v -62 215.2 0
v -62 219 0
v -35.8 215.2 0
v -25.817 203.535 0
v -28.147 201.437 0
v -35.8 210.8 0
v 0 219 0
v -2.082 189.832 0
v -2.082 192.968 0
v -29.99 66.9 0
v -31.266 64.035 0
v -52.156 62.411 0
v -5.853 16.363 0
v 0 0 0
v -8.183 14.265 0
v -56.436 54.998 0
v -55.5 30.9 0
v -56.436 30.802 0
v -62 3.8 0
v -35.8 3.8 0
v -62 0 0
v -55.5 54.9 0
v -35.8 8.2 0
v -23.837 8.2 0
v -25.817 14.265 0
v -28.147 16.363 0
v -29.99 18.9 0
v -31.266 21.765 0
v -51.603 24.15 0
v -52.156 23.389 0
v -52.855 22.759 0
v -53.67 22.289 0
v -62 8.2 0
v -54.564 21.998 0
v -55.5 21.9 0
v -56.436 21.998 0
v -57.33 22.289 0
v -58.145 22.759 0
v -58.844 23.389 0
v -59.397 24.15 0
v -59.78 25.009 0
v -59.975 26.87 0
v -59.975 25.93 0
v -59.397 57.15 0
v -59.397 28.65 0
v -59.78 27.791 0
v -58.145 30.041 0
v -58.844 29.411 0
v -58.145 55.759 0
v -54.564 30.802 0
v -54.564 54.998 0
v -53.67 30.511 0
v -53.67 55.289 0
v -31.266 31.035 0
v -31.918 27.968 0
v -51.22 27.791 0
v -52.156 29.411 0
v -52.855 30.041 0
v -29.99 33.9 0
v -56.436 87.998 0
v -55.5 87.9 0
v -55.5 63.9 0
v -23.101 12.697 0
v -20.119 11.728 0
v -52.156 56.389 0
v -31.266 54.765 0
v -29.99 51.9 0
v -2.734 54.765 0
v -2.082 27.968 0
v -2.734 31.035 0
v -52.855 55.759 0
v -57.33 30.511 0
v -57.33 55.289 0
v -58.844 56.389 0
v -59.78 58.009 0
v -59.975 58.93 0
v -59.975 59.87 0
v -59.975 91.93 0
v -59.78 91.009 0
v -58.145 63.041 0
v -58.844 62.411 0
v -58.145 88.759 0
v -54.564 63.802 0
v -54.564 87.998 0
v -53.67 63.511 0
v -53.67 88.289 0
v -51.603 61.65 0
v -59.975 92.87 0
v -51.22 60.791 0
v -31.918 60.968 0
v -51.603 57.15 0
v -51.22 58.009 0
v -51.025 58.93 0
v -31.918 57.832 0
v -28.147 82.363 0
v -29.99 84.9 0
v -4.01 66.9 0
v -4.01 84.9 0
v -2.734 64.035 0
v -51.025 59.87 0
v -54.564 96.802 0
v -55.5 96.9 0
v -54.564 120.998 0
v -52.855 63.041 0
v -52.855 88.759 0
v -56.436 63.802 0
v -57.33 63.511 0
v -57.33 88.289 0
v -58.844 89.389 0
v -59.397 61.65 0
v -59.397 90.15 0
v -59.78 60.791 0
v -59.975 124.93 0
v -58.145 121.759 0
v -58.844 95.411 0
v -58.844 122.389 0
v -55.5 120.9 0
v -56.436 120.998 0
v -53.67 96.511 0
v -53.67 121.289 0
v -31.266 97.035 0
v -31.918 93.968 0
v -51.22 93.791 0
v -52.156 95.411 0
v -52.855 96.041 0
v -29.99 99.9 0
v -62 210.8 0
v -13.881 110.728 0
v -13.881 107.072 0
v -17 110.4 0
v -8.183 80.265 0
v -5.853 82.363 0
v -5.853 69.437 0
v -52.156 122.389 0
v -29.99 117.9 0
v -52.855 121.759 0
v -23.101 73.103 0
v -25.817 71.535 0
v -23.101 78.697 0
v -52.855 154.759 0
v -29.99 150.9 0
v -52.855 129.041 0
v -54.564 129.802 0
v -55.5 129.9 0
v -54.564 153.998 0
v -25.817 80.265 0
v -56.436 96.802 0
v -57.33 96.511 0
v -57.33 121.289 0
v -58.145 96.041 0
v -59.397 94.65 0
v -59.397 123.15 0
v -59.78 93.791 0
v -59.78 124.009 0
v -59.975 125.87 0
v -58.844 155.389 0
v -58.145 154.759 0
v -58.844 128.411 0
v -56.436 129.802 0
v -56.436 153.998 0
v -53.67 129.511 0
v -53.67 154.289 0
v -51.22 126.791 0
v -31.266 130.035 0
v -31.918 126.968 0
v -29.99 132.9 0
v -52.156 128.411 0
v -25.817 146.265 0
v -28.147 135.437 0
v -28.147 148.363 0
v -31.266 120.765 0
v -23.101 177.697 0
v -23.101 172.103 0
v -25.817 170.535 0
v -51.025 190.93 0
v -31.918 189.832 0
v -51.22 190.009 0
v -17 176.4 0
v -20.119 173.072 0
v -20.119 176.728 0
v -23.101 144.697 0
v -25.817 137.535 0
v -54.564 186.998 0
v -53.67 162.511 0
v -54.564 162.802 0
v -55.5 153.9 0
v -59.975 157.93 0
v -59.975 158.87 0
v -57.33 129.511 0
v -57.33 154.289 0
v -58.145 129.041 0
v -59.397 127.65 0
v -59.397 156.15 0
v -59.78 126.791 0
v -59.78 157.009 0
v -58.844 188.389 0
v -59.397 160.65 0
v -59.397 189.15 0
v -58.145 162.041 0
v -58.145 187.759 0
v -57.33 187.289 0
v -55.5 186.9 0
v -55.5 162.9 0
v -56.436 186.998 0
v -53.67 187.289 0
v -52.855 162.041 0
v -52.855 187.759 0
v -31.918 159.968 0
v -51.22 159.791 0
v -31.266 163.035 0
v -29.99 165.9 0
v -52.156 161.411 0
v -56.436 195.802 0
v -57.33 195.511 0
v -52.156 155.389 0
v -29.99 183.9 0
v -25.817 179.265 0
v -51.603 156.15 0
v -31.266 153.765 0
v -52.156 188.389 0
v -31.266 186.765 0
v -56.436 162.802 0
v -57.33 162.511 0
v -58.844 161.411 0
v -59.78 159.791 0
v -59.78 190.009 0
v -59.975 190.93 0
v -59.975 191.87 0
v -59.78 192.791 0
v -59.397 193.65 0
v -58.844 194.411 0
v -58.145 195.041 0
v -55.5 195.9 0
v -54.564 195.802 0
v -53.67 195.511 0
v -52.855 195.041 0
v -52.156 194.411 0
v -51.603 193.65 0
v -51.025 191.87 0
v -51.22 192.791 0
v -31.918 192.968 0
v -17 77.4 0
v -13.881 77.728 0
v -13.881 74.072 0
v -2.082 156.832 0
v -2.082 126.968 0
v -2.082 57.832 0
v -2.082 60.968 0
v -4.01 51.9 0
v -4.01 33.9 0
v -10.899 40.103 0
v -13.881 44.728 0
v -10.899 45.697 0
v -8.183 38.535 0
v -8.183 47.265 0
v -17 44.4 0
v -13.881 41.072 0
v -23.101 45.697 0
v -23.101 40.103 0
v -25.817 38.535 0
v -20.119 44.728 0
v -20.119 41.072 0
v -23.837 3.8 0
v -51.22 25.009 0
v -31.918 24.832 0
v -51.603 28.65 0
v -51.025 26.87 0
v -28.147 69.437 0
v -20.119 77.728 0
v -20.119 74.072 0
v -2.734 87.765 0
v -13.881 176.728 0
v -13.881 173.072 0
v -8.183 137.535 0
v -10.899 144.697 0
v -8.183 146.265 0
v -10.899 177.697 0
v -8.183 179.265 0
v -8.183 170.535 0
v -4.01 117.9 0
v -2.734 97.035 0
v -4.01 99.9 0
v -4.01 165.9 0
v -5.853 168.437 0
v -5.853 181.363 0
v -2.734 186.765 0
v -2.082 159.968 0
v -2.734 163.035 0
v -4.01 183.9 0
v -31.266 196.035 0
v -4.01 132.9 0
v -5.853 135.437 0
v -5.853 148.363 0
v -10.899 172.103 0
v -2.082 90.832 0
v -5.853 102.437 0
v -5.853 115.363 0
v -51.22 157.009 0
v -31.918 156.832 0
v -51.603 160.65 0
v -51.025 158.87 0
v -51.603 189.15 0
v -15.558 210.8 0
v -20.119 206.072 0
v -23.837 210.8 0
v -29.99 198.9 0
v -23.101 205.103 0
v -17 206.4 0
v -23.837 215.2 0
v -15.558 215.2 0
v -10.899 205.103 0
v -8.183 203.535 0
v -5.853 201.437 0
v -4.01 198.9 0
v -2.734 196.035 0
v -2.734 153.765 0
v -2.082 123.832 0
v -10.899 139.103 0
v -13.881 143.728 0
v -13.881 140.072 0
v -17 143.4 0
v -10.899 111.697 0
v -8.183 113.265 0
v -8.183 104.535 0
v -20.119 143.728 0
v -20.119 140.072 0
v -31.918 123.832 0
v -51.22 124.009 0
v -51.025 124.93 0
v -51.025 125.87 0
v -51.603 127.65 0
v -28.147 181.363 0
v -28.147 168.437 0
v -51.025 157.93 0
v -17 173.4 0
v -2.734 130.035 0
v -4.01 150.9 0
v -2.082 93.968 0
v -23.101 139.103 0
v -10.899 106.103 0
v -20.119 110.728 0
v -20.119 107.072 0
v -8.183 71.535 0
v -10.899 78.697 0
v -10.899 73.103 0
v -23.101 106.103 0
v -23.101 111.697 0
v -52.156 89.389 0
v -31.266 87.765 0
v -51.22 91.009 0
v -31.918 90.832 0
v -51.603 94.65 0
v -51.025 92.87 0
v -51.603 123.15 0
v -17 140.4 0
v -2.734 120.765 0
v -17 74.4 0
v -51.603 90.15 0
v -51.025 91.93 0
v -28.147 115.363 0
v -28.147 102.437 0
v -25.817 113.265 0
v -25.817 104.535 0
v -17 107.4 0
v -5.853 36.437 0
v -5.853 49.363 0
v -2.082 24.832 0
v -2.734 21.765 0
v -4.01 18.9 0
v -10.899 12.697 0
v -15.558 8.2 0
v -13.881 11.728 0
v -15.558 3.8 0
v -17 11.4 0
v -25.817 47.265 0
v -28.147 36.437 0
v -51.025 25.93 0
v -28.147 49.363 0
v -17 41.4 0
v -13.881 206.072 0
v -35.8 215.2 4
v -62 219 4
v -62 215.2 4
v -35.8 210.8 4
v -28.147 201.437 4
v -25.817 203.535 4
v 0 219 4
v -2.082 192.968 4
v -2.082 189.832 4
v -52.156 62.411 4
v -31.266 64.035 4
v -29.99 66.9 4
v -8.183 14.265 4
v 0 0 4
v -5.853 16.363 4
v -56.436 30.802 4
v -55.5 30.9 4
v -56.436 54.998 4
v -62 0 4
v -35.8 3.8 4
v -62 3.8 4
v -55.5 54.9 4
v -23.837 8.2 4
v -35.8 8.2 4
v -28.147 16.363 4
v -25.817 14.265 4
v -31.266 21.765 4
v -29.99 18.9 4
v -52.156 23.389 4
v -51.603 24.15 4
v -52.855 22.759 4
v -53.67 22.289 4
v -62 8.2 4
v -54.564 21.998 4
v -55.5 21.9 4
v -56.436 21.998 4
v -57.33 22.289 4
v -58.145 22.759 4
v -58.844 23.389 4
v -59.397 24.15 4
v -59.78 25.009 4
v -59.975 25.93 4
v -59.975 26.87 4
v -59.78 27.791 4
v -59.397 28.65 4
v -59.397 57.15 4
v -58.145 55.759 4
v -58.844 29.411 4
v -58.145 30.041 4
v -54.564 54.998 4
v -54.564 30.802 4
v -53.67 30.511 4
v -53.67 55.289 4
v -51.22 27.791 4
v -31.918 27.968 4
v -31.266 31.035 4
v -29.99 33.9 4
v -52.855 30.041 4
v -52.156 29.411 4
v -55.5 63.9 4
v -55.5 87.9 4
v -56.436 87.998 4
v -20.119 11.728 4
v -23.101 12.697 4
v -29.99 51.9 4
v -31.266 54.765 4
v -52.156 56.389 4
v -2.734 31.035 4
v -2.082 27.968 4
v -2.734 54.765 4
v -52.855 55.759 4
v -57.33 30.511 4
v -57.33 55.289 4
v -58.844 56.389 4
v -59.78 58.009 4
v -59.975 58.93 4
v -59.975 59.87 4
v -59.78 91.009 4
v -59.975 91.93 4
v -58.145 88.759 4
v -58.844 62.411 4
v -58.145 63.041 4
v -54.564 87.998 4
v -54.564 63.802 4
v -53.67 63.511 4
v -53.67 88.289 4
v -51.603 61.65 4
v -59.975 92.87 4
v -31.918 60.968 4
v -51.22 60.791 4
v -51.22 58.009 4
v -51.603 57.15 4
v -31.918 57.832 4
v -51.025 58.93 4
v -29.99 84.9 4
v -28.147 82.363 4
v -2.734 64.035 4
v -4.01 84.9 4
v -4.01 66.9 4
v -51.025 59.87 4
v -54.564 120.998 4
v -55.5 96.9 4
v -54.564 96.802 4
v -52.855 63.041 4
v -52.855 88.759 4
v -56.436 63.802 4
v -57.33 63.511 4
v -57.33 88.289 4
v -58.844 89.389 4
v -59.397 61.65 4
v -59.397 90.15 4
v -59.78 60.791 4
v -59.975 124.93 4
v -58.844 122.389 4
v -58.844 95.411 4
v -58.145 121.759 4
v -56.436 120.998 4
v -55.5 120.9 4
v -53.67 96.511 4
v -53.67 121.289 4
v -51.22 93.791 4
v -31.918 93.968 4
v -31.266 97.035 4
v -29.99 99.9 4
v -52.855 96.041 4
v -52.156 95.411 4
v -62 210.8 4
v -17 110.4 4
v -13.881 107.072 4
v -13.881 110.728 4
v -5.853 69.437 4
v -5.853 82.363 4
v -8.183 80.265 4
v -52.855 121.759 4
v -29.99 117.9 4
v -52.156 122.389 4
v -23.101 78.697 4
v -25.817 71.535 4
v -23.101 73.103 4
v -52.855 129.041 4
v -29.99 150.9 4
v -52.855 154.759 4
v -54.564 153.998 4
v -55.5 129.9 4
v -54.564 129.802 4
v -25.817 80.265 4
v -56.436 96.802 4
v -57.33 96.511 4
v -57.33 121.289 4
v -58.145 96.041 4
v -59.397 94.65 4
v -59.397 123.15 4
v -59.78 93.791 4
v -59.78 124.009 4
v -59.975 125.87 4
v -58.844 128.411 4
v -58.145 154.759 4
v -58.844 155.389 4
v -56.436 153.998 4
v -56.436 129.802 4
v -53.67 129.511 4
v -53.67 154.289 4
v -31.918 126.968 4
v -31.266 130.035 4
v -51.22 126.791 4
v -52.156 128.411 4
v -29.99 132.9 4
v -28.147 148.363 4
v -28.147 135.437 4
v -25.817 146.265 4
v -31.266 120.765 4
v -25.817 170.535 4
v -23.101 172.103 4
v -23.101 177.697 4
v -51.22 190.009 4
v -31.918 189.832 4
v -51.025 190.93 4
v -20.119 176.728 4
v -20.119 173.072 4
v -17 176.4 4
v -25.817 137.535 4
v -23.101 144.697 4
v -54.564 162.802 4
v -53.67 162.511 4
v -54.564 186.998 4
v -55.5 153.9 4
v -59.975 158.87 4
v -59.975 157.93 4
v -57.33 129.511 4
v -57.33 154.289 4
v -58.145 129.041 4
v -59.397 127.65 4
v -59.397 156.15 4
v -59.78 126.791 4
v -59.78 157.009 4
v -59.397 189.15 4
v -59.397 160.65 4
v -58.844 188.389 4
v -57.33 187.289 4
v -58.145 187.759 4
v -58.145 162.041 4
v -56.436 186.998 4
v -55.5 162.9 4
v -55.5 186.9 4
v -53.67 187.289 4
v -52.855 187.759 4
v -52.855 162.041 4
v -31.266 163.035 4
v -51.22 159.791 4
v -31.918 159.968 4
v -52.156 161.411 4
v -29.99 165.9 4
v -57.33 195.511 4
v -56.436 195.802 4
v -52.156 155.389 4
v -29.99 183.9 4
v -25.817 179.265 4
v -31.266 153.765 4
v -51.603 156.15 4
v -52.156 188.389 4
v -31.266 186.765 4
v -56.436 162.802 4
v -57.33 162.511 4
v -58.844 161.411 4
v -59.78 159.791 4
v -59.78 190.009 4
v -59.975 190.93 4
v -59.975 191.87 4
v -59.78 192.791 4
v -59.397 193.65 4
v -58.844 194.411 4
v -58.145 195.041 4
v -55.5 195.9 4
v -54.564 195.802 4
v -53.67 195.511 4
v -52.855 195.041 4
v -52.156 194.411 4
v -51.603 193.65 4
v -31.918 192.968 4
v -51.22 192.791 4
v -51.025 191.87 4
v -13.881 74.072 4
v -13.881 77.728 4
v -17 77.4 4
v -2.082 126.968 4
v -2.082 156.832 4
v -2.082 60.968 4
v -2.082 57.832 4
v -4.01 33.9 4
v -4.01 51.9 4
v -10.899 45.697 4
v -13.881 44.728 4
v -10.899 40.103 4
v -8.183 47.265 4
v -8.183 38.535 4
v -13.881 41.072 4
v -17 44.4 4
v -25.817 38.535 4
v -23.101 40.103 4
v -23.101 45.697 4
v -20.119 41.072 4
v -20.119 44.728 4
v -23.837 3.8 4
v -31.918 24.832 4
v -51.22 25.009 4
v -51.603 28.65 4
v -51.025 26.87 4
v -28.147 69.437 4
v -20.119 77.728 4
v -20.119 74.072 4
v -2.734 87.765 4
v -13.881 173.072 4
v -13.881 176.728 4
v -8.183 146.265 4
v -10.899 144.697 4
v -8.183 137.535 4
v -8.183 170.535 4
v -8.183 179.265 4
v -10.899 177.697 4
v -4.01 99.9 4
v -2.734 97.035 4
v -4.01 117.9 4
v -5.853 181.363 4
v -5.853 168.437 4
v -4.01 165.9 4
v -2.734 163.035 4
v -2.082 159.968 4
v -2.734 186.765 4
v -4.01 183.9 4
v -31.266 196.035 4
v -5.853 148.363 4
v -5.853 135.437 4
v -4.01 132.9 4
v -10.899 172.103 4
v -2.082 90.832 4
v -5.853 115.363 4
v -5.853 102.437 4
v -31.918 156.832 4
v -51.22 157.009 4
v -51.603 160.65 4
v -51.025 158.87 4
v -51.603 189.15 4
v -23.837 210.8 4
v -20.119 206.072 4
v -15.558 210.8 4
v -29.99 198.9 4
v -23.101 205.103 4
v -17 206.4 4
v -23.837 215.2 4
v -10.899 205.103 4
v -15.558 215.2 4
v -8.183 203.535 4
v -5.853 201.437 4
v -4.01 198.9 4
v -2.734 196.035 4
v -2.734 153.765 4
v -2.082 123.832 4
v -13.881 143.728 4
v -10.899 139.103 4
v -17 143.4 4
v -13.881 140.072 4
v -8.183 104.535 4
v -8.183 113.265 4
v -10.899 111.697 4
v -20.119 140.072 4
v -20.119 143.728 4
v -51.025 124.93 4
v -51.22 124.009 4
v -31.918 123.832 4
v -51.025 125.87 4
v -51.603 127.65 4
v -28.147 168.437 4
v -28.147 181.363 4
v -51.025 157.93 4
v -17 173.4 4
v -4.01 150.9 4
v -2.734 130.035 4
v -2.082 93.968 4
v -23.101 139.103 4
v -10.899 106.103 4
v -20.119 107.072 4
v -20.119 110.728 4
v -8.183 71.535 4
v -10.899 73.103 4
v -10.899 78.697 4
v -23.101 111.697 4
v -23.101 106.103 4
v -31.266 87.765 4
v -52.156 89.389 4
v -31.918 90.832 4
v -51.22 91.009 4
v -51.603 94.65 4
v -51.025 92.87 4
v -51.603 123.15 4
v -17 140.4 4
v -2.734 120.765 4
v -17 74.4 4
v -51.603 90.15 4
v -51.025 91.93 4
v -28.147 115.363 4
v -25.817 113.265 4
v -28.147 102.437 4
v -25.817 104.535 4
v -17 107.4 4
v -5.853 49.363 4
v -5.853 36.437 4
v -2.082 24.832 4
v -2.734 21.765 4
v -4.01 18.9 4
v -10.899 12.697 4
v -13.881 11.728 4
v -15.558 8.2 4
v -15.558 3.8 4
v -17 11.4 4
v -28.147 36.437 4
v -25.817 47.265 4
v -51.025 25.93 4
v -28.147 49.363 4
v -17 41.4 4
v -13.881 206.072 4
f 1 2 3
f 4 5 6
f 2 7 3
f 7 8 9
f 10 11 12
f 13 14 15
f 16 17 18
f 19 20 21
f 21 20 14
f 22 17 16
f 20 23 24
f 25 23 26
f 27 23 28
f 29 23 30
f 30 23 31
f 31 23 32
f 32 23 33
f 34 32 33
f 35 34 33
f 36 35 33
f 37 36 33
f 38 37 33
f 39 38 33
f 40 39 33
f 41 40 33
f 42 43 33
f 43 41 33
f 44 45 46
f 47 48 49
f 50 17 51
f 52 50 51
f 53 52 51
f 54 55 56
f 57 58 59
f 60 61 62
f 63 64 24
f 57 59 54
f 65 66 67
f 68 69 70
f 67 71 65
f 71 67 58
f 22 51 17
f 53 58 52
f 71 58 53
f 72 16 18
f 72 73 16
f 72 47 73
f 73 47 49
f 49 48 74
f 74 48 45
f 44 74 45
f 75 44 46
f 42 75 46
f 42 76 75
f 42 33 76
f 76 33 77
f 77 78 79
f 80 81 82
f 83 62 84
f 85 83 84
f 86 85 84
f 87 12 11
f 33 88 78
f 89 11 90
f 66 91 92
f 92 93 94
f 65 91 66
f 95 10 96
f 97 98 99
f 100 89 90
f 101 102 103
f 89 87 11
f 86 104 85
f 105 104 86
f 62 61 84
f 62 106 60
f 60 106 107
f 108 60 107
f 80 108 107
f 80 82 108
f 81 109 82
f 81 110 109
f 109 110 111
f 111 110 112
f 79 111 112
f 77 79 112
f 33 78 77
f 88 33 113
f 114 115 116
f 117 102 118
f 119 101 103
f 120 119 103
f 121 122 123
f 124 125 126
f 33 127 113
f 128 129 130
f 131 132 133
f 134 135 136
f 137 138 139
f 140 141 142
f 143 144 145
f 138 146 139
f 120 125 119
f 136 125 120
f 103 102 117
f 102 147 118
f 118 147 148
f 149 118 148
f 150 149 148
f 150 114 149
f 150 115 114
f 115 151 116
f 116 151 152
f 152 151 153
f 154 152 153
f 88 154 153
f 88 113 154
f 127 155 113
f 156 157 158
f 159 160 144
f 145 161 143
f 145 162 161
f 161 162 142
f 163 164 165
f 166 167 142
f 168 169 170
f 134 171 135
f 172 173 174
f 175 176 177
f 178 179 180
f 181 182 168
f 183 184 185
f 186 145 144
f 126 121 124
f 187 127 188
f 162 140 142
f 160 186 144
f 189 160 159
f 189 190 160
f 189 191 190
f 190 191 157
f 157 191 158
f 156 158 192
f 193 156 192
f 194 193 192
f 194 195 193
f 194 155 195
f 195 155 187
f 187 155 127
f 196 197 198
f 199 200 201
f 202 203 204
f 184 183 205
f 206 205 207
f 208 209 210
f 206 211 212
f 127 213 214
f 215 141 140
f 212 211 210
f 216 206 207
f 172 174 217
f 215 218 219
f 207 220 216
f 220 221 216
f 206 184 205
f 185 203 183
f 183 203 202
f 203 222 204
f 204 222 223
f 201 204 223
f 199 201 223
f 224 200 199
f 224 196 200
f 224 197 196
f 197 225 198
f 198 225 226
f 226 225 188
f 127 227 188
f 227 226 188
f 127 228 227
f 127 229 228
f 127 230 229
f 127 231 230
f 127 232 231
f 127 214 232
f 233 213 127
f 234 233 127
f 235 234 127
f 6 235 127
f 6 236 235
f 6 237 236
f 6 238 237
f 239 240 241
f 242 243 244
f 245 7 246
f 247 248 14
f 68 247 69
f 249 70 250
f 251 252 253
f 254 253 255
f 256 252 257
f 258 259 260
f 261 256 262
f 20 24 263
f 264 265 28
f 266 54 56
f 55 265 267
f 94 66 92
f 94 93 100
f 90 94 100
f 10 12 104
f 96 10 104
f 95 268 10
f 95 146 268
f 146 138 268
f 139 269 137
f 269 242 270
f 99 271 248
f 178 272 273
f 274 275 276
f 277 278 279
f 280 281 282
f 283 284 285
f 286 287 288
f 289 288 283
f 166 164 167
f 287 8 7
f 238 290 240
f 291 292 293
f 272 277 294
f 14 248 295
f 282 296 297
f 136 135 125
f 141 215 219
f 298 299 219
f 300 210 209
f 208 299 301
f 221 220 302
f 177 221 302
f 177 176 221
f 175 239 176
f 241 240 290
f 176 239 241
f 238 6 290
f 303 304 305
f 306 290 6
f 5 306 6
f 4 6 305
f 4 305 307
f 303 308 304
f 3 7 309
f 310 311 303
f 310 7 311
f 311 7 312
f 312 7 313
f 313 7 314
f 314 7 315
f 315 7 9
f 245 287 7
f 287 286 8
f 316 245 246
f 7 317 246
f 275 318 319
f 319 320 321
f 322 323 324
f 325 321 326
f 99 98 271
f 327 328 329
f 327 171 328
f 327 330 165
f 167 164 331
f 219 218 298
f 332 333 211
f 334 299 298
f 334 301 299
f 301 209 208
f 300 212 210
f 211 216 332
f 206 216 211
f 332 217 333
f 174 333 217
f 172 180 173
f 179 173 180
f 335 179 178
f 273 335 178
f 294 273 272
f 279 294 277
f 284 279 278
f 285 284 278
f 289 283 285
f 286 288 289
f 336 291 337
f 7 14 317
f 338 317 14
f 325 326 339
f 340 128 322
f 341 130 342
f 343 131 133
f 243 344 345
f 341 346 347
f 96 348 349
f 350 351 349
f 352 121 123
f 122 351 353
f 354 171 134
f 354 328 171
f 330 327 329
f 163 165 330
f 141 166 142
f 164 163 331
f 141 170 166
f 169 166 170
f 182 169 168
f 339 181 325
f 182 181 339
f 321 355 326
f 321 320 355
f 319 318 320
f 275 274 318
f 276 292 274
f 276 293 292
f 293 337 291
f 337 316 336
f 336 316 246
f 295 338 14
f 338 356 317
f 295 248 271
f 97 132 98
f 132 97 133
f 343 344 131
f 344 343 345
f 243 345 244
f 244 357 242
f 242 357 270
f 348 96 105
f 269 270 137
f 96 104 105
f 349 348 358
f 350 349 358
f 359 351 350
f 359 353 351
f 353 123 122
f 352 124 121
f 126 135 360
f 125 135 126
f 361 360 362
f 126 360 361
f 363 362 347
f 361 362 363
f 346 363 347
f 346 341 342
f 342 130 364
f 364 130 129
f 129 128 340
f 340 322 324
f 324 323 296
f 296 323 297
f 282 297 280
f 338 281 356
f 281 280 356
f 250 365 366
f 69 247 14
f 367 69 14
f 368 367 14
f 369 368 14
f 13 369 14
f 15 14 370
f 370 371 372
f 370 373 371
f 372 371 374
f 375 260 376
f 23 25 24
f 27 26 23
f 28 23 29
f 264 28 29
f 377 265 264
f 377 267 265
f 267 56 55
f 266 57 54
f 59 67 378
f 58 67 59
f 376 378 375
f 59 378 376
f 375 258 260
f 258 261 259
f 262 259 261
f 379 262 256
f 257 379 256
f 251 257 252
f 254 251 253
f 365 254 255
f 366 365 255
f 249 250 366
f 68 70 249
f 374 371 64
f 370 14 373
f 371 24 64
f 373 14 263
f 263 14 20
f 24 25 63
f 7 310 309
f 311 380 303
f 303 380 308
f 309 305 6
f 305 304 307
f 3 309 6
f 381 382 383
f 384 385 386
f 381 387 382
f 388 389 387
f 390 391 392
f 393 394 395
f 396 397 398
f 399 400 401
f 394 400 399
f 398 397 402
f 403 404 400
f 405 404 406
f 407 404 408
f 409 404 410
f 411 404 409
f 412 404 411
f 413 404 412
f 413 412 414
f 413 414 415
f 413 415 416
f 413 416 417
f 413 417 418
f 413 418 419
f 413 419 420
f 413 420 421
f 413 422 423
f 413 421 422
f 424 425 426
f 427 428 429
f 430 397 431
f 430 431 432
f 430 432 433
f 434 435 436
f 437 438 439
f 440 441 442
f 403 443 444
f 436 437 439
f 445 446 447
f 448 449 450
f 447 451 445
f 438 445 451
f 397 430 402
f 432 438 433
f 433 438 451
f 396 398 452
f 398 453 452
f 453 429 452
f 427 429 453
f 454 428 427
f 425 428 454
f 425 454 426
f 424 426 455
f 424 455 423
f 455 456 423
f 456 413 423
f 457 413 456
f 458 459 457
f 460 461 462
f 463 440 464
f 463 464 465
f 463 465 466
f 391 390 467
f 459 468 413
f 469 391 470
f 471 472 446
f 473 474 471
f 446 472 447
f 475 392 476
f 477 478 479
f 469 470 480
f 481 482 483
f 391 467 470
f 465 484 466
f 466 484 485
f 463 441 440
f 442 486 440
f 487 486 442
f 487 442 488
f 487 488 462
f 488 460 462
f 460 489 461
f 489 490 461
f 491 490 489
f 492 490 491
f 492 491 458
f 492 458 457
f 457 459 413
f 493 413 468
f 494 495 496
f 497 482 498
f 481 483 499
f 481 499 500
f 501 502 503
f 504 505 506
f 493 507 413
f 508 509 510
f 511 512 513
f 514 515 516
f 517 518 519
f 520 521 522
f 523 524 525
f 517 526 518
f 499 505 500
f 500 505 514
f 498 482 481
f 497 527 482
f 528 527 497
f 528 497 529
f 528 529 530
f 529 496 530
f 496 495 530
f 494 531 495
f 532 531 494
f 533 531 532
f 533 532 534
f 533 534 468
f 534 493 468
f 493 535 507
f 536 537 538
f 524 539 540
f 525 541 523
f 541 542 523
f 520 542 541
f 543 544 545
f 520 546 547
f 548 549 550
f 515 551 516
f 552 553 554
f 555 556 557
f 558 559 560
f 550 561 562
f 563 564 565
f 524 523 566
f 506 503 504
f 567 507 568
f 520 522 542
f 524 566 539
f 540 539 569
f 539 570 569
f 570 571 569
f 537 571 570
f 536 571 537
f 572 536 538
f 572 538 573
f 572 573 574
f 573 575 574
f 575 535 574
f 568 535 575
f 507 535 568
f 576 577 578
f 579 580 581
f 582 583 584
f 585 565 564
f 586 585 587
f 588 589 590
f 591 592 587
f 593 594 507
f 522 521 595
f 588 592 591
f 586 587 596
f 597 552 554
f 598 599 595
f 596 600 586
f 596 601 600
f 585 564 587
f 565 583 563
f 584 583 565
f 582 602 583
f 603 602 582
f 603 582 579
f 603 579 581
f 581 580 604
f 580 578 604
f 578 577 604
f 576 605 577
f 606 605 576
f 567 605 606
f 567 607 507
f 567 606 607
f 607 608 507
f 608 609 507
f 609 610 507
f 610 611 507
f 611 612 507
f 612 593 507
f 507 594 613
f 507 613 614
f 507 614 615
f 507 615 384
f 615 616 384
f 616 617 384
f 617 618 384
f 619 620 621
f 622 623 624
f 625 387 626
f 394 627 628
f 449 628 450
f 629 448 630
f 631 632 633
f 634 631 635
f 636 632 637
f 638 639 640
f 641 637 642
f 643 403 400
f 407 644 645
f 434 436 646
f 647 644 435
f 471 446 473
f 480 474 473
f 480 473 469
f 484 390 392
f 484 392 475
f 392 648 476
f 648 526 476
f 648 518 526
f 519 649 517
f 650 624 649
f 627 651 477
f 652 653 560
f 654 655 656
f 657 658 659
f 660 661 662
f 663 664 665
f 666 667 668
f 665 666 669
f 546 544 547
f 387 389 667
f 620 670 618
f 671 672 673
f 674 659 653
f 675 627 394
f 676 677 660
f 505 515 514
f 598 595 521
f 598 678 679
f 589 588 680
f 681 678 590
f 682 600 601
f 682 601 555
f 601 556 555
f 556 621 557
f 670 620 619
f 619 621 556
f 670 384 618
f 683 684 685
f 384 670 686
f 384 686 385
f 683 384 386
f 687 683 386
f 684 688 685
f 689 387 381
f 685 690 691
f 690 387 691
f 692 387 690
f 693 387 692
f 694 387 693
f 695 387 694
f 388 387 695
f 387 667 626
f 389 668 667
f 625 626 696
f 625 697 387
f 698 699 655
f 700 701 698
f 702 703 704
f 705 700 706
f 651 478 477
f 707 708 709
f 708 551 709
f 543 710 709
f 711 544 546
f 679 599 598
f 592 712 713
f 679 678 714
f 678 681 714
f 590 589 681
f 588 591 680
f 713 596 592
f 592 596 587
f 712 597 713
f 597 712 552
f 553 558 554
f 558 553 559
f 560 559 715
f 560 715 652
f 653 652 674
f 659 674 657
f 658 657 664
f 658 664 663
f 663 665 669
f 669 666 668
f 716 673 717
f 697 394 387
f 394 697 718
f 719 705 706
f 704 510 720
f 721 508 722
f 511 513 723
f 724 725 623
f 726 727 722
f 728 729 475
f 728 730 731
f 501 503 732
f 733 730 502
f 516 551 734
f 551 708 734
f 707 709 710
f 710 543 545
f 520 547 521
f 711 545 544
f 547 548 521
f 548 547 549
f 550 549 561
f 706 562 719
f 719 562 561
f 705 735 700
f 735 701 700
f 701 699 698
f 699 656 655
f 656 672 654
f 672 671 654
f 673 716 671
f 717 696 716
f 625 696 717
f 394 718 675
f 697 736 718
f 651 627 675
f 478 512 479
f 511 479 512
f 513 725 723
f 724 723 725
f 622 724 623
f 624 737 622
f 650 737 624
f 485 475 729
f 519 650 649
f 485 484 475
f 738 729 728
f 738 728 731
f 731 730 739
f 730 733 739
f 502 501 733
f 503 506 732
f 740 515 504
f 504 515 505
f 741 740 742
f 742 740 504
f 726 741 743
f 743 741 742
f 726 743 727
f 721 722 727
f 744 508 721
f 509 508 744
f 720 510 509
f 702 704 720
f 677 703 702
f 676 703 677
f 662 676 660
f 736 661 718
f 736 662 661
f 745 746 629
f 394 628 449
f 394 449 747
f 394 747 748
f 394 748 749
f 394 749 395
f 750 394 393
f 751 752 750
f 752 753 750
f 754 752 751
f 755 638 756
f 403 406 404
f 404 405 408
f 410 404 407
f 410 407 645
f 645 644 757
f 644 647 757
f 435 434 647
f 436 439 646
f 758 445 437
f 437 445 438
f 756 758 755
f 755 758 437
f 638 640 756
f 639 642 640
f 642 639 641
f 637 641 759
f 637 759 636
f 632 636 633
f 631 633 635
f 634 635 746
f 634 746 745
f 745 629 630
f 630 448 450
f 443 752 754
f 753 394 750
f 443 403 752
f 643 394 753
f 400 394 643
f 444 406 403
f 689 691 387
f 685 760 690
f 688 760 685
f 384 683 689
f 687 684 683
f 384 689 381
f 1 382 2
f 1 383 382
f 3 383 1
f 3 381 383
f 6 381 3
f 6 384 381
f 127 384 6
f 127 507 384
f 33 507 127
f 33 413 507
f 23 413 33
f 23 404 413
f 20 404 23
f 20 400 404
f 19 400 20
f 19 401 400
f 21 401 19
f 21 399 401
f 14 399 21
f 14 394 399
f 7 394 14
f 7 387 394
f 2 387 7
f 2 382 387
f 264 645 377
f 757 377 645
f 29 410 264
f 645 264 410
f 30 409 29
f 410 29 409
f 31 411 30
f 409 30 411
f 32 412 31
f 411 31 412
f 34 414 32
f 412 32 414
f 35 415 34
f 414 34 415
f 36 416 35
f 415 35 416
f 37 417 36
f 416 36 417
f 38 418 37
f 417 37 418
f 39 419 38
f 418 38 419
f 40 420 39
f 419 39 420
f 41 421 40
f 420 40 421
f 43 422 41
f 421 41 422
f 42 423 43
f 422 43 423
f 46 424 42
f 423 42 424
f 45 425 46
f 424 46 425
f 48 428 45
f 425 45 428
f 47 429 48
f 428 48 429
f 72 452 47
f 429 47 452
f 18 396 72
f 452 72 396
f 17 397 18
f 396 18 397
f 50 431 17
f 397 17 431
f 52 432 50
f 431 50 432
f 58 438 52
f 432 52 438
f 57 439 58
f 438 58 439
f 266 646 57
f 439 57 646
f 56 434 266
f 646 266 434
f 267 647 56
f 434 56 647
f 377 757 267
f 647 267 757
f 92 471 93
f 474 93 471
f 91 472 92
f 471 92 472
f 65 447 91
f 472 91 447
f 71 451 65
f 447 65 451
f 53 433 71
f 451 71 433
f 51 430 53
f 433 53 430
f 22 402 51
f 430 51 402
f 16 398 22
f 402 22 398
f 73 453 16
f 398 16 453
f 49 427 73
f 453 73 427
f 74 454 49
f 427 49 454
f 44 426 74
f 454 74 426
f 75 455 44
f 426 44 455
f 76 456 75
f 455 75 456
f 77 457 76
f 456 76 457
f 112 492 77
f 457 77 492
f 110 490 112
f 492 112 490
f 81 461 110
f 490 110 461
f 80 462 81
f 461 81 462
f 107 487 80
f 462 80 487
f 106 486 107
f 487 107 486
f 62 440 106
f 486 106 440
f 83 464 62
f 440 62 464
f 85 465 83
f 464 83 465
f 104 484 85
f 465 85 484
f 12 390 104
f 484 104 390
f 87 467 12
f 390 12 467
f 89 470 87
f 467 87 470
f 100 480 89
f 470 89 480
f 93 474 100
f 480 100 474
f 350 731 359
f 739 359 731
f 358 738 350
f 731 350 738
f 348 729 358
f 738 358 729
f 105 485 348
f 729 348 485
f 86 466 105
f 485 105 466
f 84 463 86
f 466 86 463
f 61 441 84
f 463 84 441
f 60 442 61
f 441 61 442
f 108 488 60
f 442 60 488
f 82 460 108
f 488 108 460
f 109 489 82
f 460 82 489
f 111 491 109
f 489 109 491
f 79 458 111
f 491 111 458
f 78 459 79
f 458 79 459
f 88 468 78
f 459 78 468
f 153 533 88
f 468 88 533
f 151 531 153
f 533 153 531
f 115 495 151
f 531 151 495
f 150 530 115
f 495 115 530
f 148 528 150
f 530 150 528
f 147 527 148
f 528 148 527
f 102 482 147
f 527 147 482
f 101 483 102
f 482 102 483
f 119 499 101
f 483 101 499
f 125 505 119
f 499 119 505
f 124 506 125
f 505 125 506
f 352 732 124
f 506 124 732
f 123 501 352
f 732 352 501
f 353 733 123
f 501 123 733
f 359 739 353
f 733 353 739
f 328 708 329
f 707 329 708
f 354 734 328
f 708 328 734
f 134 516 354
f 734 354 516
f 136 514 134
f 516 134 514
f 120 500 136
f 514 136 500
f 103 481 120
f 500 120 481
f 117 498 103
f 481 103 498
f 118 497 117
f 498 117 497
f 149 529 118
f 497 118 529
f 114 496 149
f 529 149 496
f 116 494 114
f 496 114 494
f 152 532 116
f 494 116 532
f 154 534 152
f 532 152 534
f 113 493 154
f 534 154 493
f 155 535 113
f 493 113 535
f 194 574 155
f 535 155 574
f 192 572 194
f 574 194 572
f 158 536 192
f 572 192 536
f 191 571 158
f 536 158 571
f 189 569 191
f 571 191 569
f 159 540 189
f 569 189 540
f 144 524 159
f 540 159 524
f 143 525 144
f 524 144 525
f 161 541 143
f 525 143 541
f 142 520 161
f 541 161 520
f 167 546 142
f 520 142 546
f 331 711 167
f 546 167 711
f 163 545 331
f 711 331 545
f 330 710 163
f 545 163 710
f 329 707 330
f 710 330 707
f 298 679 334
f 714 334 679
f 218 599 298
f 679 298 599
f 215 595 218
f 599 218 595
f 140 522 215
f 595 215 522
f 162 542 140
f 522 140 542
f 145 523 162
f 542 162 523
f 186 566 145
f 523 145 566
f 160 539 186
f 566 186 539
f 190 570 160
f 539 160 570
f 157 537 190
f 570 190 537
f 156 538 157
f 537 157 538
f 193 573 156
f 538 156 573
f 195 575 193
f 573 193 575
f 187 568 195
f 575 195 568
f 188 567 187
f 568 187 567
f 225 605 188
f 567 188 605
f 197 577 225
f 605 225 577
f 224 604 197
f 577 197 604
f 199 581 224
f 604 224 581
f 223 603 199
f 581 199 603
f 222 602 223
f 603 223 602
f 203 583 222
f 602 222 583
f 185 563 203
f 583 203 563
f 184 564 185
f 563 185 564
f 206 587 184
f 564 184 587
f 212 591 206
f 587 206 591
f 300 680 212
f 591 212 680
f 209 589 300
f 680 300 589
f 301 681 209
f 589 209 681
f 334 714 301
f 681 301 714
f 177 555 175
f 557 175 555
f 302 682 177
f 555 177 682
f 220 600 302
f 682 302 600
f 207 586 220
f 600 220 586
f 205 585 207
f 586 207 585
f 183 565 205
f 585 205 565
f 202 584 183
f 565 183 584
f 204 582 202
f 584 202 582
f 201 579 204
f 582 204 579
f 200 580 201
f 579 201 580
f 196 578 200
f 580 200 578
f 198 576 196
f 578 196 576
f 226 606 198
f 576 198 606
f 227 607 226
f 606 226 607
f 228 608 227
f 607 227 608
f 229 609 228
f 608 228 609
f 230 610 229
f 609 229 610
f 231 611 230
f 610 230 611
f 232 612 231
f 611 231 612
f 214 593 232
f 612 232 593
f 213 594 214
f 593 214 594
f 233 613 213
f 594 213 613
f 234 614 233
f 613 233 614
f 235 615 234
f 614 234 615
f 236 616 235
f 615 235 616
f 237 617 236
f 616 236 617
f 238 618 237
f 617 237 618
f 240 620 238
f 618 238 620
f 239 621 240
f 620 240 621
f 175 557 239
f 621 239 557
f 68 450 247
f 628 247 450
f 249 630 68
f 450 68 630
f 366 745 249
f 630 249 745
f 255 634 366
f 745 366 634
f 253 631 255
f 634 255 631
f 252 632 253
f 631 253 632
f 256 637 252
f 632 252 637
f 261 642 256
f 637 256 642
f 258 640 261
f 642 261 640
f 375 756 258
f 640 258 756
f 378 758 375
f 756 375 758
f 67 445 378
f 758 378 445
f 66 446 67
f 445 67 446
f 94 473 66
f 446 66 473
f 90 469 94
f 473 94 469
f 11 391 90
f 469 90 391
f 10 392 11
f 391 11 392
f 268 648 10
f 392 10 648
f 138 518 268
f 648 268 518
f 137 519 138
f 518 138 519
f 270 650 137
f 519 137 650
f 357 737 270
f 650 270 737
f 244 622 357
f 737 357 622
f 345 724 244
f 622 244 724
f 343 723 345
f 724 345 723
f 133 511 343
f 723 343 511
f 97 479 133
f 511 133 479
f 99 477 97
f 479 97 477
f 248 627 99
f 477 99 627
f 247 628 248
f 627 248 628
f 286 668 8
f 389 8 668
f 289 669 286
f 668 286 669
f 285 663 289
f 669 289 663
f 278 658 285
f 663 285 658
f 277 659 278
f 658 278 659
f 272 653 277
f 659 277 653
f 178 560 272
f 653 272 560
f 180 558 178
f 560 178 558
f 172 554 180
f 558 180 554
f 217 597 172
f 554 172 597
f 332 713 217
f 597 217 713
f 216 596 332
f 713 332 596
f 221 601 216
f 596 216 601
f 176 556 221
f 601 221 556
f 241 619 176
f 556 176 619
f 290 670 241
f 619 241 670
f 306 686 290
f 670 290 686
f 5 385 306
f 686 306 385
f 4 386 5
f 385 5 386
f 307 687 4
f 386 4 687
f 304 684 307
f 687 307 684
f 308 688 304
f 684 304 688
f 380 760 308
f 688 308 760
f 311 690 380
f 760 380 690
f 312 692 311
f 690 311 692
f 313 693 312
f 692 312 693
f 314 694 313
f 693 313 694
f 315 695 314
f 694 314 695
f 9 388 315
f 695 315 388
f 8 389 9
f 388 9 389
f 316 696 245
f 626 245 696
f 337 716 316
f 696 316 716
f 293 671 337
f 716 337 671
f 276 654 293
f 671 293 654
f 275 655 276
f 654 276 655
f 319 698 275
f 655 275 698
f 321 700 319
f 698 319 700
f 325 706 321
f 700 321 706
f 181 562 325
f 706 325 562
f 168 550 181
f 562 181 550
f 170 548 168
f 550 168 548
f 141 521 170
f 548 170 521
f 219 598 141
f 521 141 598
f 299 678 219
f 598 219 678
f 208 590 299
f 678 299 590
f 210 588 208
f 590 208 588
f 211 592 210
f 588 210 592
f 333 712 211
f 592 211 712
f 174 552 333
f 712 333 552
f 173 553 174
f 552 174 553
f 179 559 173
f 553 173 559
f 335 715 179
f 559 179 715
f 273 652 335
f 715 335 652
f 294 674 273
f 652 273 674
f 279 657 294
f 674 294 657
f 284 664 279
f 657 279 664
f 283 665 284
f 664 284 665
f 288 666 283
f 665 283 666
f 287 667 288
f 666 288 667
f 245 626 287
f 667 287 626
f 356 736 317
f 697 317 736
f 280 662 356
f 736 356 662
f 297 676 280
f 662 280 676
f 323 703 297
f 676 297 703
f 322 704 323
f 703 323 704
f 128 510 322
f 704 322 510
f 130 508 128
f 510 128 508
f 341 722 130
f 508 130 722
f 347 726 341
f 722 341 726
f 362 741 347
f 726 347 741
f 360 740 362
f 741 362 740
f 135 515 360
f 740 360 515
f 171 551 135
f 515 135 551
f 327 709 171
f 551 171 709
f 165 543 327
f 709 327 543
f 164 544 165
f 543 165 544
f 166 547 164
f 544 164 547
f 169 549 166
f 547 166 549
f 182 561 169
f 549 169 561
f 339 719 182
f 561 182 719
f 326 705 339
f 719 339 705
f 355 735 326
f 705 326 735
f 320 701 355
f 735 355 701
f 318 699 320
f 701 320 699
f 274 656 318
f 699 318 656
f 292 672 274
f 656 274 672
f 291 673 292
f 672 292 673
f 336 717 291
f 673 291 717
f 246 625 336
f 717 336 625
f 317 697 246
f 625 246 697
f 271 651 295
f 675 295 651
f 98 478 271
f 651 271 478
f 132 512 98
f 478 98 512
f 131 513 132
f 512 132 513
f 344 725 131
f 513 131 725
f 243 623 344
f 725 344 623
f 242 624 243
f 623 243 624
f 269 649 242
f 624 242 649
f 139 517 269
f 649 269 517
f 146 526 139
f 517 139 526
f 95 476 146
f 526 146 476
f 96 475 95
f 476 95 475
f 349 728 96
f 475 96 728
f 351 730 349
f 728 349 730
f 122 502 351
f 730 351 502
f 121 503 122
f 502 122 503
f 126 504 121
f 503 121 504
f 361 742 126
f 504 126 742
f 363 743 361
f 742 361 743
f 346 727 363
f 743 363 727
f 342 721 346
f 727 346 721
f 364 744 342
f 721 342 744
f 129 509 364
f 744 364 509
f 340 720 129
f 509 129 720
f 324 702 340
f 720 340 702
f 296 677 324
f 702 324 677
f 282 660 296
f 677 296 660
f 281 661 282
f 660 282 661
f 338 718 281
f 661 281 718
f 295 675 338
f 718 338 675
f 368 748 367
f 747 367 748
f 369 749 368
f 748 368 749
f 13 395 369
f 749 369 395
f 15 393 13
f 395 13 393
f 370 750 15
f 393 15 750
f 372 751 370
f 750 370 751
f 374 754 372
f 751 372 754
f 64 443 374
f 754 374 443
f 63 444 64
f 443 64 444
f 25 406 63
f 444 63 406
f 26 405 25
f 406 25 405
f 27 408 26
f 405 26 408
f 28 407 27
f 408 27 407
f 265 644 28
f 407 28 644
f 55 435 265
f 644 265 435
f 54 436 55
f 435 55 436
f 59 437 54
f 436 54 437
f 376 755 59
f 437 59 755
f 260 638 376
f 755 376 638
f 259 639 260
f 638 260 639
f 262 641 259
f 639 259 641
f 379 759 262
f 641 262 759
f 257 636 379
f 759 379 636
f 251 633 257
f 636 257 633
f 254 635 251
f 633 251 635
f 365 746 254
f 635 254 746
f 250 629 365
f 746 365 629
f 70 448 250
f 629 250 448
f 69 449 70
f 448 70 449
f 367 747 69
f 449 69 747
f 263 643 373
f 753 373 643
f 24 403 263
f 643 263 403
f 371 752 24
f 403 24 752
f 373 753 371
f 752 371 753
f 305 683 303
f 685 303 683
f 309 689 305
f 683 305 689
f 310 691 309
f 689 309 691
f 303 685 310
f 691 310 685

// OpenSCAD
/*
 * Miniature Paint Shelves
 * By Craig Wood
 *
 * Copyright 2019 Craig Wood - http://github.com/w3ace
 * This program is free software: you can redistribute it and/or modify
 * it under the terms of the GNU General Public License as published by
 * the Free Software Foundation, either version 3 of the License, or
 * (at your option) any later version.
 *
 * This program is distributed in thehope that it will be useful,
 * but WITHOUT ANY WARRANTY; without even the implied warranty of
 * MERCHANTABILITY or FITNESS FOR A PARTICULAR PURPOSE.  See the
 * GNU General Public License for more details.
 *
 * See <http://www.gnu.org/licenses/>.

 */



$fn=30;

num_shelves = 4;


// SHELF WIDTH, HEIGHT, AND THICKNESS should be based on known paint brands
// VALLEJO : 
// shelf_size = 62;
// shelf_width = 44;
// shelf_depth = 28;
// large_holes = 30;
// small_holes = 9;



shelf_size = 62;
large_holes = 30;
small_holes = 9;
num_holes = 6;

shelf_width=36;
shelf_depth=16;

shelf_thickness = 4;
slop = .2;


/*
shelf_angle = 35;
shelf_size = 29;
large_holes = 15;
small_holes = 4.5;
num_holes = 6;

shelf_width=22;
shelf_depth=14;

shelf_thickness = 2;
slop = .2;
*/

	hyp=hypotenuse(shelf_width,shelf_depth);
	shelf_length=num_holes*large_holes*1.1+large_holes*.7;

	echo (shelf_length);


		rotate([0,0,90])
				make_shelf(num_holes,large_holes,small_holes,shelf_thickness,
					shelf_size,shelf_width,slop,hyp,type="middle");
//
//first_plate();

//// second_plate();
	// MIDDLE SHELF
module first_plate ()
{
	hyp=hypotenuse(shelf_width,shelf_depth);

	// MIDDLE SHELF
	translate([sin(atan(1.8/2.6))*(hyp*(num_shelves+1.3))+shelf_size+1,0,0])

		rotate([0,0,90])
				make_shelf(num_holes,large_holes,small_holes,shelf_thickness,
					shelf_size,shelf_width,slop,hyp,type="middle");

	// UPRIGHT
	translate([0,1,0])
	rotate([0,0,90-atan(1.8/2.6)])
		make_shelf_upright (num_shelves,shelf_width,shelf_depth,shelf_thickness);

  // UPRIGHT
	translate([0,0,shelf_thickness])
	rotate([180,0,90-atan(1.8/2.6)])
		make_shelf_upright (num_shelves,shelf_width,shelf_depth,shelf_thickness);
}

module second_plate ()
{

	hyp=hypotenuse(shelf_width,shelf_depth);

	for(i=[1:3])
		translate([(shelf_size+1)*i,0,0])
			rotate([0,0,90])
				linear_extrude(height=shelf_thickness)
					make_shelf(num_holes,large_holes,small_holes,shelf_thickness,
						shelf_size,shelf_width,slop,hyp);

}

function hypotenuse (l1,l2) = sqrt(l1*l1+l2*l2);

module make_shelf (num_holes,large_holes,small_holes,shelf_thickness,shelf_size,shelf_width,slop,hyp,type="middle")
{

	shelf_length=num_holes*large_holes*1.1+large_holes*.7;


	union() 
	{
		if(type=="top")
	  	translate([0,shelf_width,0])
				rotate([90,0,0])
					difference () {
						union () {
							linear_extrude(height=shelf_thickness)
								square([shelf_length,shelf_width]);
							translate([0,shelf_width,shelf_thickness])	
								rotate([0,90,0])
									cylinder(shelf_length,r=shelf_thickness);
						}
						translate([shelf_width-shelf_thickness,-shelf_depth*.8,0])
							square(size=[shelf_thickness,shelf_depth*.4]);
					}

		linear_extrude(height=shelf_thickness)
			difference()
			{
				if(type=="bottom")
				{
					square([shelf_length,shelf_size-small_holes-2]);
				} else {
					square([shelf_length,shelf_size]);
				}
				for(i=[1:num_holes])
				{
					if(type != "top")
						translate ([(i-.2)*large_holes*1.1,2+(large_holes/2),0])
							circle (d=large_holes);
					if(type != "bottom")
						translate ([(i-.2)*large_holes*1.1,(shelf_width-large_holes)+(large_holes*1.5)+(small_holes/2),0])
							circle (d=small_holes);
				}
			
				// SLOTS FOR UPRIGHTS
				translate([shelf_thickness-slop,shelf_width-slop,0])
					square([shelf_thickness+slop*2,shelf_size-shelf_width+slop*2]);
				translate([shelf_length-shelf_thickness*2-slop,shelf_width-slop,0])
					square([shelf_thickness+slop*2,shelf_size-shelf_width+slop*2]);

				// SLOTS FOR NOTCHES
				translate([shelf_thickness-slop,hyp*.4-slop])
					square(size=[shelf_thickness+slop*2,hyp*.2+slop*2]);
				translate([shelf_length-shelf_thickness*2-slop,hyp*.4-slop])
					square(size=[shelf_thickness+slop*2,hyp*.2+slop*2]);
			}
	}
}

module make_shelf_upright (num_shelves,shelf_width,shelf_depth,shelf_thickness)
{

	hyp = hypotenuse(shelf_width,shelf_depth);

	linear_extrude(height=shelf_thickness)
		difference()
		{

			// MAIN TRIANGLE
			polygon(points=[[0,0],[hyp*(num_shelves+1.3),0],[hyp*2.6,hyp*1.8]]);

			// SHELF CUTOUTS 
			translate([-hyp*.8,0,0])	
			for(i=[1:num_shelves])
			{
				color("Red")
				translate([hypotenuse(shelf_width,shelf_depth)*i,0,0])
					rotate([0,0,90-atan(shelf_width/shelf_depth	)])
						difference ()
						{					
						translate([0,-shelf_depth,0])
							square(size=[shelf_width,shelf_depth]);

						// Notches to attach shelves
						translate([hyp*.4,-shelf_thickness,0])	
							square(size=[hyp*.2,shelf_thickness]);
						
						// Extra Notch for top shelf
						if (i==1){
							translate([shelf_width-shelf_thickness,-shelf_depth*.8,0])
								square(size=[shelf_thickness,shelf_depth*.4]);
						}
					}
			}

			// ROWS OF CIRCLE CUTOUTS
			// 
			//
		for(j=[1:num_shelves-1])
				for(i=[1:num_shelves-j])
					translate([hyp*i+hyp*((j-.3)*.5),hyp*(.55+(j-1)*.3),0])
						if(i==num_shelves-j)
						{
							translate([3,3])
							rotate([0,0,124.7])
								scale([1,2])
									circle(d=hyp*.4);
						} else {
								circle(d=hyp*.4);
						}




/*
				for(i=[1:num_shelves-2])
					translate([hyp*i+hyp,hyp*.85,0])
						circle(d=hyp*.4);
				
				for(i=[1:num_shelves-3])
					translate([hyp*i+hyp*1.5,hyp*1.1,0])
						circle(d=hyp*.4);
*/
			//CUT OFF THE BOTTOM POINT
			polygon(points=[[hyp*(num_shelves+.5),0],[hyp*(num_shelves+2),0],[(hyp*(num_shelves+.5)),hyp]]);		
		}
}
/*
union()
{
	for(i = [1:num_shelves])
	{	
		translate([(num_shelves-i)*shelf_width,(i-1)*shelf_depth])	
			scale([i-(i*.25),i])
				polygon(points=[[0,0],[shelf_width,0],[0,shelf_depth*3]]);


	}
}	

*/
